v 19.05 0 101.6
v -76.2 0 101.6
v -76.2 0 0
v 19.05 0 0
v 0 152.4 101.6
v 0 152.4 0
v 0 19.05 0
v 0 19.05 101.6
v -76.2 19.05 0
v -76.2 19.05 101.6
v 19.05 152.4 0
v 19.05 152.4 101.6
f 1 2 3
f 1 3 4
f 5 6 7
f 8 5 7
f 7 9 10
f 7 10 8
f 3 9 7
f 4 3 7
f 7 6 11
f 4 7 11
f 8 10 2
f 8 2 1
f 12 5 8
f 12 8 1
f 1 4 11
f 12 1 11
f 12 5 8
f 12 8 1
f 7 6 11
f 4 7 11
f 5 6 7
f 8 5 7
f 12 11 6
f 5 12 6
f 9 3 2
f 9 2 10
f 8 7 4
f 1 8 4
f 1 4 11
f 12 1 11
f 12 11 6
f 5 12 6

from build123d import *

# Parameters (mm, degrees)
F1_DEPTH = 101.6
F0_W     = 76.2
F0_H     = 19.05
F2_DEPTH = 101.6


with BuildPart() as f1:
    # F0 (on Top) → F1 (new body)
    with BuildSketch(Plane.XY):
        Polygon((0, 152.4), (0, 19.05), (19.05, 0), (19.05, 152.4), align=None)
    extrude(amount=F1_DEPTH)


with BuildPart() as f2:
    # F0 (on Top) → F2 (new body)
    with BuildSketch(Plane.XY):
        with Locations((-38.1, 9.525)):
            Rectangle(F0_W, F0_H)
        Polygon((0, 19.05), (0, 0), (19.05, 0), align=None)
        Polygon((0, 152.4), (0, 19.05), (19.05, 0), (19.05, 152.4), align=None)
    extrude(amount=F2_DEPTH)


solid = Compound([f1.part, f2.part])
